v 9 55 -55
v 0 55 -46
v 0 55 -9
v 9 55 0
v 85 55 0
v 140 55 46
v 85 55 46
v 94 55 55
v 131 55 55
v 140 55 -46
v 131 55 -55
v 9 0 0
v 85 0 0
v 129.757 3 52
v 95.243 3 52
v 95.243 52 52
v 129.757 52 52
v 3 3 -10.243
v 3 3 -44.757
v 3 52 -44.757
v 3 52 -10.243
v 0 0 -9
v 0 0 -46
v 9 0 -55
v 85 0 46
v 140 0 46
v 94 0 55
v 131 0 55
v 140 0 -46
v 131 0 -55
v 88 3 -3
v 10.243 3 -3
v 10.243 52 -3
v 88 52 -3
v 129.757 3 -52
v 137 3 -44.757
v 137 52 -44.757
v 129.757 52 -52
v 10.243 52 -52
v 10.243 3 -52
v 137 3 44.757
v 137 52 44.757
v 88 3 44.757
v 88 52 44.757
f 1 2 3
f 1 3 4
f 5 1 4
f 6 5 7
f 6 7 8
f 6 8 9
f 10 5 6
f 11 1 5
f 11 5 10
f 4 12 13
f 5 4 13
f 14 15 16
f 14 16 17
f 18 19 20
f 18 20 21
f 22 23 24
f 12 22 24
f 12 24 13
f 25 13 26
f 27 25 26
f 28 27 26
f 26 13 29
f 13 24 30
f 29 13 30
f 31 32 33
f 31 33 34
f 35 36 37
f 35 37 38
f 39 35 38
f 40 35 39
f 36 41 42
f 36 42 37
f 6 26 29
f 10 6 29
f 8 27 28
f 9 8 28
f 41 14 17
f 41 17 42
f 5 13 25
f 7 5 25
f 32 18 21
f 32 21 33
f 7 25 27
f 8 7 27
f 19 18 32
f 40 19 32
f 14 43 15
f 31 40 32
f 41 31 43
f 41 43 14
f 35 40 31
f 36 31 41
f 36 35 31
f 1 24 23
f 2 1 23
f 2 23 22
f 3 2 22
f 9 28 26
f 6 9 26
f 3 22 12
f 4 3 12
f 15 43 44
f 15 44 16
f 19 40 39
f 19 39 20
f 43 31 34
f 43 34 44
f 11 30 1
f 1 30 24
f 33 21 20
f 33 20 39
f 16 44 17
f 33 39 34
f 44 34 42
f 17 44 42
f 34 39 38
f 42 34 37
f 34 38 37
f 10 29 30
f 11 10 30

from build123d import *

# Parameters (mm, degrees)
BOSS_EXTRUDE1_DEPTH = 55
SHELL1_START        = 3
SHELL1_DEPTH        = 49


# Read off the part's stored shape, not the designer's step: Shell1
with BuildPart() as part:
    # Sketch2 → Boss-Extrude1 (new body)
    with BuildSketch(Plane(origin=(0, 0, 0), x_dir=(1, 0, 0), z_dir=(0, 1, 0))):
        Polygon((9, 55), (0, 46), (0, 9), (9, 0), (85, 0), (140, 0), (140, 46), (131, 55), align=None)
        Polygon((140, 0), (85, 0), (85, -46), (94, -55), (131, -55), (140, -46), align=None)
    extrude(amount=BOSS_EXTRUDE1_DEPTH)

    # Shell1 outline → Shell1 (cut)
    with BuildSketch(Plane(origin=(0, 0, 0), x_dir=(1, 0, 0), z_dir=(0, 1, 0)).offset(SHELL1_START)):
        Polygon((10.242640687, 3), (88, 3), (88, -44.757359313), (95.242640687, -52), (129.757359313, -52), (137, -44.757359313), (137, 44.757359313), (129.757359313, 52), (10.242640687, 52), (3, 44.757359313), (3, 10.242640687), align=None)
    extrude(amount=SHELL1_DEPTH, mode=Mode.SUBTRACT)


solid = part.part
